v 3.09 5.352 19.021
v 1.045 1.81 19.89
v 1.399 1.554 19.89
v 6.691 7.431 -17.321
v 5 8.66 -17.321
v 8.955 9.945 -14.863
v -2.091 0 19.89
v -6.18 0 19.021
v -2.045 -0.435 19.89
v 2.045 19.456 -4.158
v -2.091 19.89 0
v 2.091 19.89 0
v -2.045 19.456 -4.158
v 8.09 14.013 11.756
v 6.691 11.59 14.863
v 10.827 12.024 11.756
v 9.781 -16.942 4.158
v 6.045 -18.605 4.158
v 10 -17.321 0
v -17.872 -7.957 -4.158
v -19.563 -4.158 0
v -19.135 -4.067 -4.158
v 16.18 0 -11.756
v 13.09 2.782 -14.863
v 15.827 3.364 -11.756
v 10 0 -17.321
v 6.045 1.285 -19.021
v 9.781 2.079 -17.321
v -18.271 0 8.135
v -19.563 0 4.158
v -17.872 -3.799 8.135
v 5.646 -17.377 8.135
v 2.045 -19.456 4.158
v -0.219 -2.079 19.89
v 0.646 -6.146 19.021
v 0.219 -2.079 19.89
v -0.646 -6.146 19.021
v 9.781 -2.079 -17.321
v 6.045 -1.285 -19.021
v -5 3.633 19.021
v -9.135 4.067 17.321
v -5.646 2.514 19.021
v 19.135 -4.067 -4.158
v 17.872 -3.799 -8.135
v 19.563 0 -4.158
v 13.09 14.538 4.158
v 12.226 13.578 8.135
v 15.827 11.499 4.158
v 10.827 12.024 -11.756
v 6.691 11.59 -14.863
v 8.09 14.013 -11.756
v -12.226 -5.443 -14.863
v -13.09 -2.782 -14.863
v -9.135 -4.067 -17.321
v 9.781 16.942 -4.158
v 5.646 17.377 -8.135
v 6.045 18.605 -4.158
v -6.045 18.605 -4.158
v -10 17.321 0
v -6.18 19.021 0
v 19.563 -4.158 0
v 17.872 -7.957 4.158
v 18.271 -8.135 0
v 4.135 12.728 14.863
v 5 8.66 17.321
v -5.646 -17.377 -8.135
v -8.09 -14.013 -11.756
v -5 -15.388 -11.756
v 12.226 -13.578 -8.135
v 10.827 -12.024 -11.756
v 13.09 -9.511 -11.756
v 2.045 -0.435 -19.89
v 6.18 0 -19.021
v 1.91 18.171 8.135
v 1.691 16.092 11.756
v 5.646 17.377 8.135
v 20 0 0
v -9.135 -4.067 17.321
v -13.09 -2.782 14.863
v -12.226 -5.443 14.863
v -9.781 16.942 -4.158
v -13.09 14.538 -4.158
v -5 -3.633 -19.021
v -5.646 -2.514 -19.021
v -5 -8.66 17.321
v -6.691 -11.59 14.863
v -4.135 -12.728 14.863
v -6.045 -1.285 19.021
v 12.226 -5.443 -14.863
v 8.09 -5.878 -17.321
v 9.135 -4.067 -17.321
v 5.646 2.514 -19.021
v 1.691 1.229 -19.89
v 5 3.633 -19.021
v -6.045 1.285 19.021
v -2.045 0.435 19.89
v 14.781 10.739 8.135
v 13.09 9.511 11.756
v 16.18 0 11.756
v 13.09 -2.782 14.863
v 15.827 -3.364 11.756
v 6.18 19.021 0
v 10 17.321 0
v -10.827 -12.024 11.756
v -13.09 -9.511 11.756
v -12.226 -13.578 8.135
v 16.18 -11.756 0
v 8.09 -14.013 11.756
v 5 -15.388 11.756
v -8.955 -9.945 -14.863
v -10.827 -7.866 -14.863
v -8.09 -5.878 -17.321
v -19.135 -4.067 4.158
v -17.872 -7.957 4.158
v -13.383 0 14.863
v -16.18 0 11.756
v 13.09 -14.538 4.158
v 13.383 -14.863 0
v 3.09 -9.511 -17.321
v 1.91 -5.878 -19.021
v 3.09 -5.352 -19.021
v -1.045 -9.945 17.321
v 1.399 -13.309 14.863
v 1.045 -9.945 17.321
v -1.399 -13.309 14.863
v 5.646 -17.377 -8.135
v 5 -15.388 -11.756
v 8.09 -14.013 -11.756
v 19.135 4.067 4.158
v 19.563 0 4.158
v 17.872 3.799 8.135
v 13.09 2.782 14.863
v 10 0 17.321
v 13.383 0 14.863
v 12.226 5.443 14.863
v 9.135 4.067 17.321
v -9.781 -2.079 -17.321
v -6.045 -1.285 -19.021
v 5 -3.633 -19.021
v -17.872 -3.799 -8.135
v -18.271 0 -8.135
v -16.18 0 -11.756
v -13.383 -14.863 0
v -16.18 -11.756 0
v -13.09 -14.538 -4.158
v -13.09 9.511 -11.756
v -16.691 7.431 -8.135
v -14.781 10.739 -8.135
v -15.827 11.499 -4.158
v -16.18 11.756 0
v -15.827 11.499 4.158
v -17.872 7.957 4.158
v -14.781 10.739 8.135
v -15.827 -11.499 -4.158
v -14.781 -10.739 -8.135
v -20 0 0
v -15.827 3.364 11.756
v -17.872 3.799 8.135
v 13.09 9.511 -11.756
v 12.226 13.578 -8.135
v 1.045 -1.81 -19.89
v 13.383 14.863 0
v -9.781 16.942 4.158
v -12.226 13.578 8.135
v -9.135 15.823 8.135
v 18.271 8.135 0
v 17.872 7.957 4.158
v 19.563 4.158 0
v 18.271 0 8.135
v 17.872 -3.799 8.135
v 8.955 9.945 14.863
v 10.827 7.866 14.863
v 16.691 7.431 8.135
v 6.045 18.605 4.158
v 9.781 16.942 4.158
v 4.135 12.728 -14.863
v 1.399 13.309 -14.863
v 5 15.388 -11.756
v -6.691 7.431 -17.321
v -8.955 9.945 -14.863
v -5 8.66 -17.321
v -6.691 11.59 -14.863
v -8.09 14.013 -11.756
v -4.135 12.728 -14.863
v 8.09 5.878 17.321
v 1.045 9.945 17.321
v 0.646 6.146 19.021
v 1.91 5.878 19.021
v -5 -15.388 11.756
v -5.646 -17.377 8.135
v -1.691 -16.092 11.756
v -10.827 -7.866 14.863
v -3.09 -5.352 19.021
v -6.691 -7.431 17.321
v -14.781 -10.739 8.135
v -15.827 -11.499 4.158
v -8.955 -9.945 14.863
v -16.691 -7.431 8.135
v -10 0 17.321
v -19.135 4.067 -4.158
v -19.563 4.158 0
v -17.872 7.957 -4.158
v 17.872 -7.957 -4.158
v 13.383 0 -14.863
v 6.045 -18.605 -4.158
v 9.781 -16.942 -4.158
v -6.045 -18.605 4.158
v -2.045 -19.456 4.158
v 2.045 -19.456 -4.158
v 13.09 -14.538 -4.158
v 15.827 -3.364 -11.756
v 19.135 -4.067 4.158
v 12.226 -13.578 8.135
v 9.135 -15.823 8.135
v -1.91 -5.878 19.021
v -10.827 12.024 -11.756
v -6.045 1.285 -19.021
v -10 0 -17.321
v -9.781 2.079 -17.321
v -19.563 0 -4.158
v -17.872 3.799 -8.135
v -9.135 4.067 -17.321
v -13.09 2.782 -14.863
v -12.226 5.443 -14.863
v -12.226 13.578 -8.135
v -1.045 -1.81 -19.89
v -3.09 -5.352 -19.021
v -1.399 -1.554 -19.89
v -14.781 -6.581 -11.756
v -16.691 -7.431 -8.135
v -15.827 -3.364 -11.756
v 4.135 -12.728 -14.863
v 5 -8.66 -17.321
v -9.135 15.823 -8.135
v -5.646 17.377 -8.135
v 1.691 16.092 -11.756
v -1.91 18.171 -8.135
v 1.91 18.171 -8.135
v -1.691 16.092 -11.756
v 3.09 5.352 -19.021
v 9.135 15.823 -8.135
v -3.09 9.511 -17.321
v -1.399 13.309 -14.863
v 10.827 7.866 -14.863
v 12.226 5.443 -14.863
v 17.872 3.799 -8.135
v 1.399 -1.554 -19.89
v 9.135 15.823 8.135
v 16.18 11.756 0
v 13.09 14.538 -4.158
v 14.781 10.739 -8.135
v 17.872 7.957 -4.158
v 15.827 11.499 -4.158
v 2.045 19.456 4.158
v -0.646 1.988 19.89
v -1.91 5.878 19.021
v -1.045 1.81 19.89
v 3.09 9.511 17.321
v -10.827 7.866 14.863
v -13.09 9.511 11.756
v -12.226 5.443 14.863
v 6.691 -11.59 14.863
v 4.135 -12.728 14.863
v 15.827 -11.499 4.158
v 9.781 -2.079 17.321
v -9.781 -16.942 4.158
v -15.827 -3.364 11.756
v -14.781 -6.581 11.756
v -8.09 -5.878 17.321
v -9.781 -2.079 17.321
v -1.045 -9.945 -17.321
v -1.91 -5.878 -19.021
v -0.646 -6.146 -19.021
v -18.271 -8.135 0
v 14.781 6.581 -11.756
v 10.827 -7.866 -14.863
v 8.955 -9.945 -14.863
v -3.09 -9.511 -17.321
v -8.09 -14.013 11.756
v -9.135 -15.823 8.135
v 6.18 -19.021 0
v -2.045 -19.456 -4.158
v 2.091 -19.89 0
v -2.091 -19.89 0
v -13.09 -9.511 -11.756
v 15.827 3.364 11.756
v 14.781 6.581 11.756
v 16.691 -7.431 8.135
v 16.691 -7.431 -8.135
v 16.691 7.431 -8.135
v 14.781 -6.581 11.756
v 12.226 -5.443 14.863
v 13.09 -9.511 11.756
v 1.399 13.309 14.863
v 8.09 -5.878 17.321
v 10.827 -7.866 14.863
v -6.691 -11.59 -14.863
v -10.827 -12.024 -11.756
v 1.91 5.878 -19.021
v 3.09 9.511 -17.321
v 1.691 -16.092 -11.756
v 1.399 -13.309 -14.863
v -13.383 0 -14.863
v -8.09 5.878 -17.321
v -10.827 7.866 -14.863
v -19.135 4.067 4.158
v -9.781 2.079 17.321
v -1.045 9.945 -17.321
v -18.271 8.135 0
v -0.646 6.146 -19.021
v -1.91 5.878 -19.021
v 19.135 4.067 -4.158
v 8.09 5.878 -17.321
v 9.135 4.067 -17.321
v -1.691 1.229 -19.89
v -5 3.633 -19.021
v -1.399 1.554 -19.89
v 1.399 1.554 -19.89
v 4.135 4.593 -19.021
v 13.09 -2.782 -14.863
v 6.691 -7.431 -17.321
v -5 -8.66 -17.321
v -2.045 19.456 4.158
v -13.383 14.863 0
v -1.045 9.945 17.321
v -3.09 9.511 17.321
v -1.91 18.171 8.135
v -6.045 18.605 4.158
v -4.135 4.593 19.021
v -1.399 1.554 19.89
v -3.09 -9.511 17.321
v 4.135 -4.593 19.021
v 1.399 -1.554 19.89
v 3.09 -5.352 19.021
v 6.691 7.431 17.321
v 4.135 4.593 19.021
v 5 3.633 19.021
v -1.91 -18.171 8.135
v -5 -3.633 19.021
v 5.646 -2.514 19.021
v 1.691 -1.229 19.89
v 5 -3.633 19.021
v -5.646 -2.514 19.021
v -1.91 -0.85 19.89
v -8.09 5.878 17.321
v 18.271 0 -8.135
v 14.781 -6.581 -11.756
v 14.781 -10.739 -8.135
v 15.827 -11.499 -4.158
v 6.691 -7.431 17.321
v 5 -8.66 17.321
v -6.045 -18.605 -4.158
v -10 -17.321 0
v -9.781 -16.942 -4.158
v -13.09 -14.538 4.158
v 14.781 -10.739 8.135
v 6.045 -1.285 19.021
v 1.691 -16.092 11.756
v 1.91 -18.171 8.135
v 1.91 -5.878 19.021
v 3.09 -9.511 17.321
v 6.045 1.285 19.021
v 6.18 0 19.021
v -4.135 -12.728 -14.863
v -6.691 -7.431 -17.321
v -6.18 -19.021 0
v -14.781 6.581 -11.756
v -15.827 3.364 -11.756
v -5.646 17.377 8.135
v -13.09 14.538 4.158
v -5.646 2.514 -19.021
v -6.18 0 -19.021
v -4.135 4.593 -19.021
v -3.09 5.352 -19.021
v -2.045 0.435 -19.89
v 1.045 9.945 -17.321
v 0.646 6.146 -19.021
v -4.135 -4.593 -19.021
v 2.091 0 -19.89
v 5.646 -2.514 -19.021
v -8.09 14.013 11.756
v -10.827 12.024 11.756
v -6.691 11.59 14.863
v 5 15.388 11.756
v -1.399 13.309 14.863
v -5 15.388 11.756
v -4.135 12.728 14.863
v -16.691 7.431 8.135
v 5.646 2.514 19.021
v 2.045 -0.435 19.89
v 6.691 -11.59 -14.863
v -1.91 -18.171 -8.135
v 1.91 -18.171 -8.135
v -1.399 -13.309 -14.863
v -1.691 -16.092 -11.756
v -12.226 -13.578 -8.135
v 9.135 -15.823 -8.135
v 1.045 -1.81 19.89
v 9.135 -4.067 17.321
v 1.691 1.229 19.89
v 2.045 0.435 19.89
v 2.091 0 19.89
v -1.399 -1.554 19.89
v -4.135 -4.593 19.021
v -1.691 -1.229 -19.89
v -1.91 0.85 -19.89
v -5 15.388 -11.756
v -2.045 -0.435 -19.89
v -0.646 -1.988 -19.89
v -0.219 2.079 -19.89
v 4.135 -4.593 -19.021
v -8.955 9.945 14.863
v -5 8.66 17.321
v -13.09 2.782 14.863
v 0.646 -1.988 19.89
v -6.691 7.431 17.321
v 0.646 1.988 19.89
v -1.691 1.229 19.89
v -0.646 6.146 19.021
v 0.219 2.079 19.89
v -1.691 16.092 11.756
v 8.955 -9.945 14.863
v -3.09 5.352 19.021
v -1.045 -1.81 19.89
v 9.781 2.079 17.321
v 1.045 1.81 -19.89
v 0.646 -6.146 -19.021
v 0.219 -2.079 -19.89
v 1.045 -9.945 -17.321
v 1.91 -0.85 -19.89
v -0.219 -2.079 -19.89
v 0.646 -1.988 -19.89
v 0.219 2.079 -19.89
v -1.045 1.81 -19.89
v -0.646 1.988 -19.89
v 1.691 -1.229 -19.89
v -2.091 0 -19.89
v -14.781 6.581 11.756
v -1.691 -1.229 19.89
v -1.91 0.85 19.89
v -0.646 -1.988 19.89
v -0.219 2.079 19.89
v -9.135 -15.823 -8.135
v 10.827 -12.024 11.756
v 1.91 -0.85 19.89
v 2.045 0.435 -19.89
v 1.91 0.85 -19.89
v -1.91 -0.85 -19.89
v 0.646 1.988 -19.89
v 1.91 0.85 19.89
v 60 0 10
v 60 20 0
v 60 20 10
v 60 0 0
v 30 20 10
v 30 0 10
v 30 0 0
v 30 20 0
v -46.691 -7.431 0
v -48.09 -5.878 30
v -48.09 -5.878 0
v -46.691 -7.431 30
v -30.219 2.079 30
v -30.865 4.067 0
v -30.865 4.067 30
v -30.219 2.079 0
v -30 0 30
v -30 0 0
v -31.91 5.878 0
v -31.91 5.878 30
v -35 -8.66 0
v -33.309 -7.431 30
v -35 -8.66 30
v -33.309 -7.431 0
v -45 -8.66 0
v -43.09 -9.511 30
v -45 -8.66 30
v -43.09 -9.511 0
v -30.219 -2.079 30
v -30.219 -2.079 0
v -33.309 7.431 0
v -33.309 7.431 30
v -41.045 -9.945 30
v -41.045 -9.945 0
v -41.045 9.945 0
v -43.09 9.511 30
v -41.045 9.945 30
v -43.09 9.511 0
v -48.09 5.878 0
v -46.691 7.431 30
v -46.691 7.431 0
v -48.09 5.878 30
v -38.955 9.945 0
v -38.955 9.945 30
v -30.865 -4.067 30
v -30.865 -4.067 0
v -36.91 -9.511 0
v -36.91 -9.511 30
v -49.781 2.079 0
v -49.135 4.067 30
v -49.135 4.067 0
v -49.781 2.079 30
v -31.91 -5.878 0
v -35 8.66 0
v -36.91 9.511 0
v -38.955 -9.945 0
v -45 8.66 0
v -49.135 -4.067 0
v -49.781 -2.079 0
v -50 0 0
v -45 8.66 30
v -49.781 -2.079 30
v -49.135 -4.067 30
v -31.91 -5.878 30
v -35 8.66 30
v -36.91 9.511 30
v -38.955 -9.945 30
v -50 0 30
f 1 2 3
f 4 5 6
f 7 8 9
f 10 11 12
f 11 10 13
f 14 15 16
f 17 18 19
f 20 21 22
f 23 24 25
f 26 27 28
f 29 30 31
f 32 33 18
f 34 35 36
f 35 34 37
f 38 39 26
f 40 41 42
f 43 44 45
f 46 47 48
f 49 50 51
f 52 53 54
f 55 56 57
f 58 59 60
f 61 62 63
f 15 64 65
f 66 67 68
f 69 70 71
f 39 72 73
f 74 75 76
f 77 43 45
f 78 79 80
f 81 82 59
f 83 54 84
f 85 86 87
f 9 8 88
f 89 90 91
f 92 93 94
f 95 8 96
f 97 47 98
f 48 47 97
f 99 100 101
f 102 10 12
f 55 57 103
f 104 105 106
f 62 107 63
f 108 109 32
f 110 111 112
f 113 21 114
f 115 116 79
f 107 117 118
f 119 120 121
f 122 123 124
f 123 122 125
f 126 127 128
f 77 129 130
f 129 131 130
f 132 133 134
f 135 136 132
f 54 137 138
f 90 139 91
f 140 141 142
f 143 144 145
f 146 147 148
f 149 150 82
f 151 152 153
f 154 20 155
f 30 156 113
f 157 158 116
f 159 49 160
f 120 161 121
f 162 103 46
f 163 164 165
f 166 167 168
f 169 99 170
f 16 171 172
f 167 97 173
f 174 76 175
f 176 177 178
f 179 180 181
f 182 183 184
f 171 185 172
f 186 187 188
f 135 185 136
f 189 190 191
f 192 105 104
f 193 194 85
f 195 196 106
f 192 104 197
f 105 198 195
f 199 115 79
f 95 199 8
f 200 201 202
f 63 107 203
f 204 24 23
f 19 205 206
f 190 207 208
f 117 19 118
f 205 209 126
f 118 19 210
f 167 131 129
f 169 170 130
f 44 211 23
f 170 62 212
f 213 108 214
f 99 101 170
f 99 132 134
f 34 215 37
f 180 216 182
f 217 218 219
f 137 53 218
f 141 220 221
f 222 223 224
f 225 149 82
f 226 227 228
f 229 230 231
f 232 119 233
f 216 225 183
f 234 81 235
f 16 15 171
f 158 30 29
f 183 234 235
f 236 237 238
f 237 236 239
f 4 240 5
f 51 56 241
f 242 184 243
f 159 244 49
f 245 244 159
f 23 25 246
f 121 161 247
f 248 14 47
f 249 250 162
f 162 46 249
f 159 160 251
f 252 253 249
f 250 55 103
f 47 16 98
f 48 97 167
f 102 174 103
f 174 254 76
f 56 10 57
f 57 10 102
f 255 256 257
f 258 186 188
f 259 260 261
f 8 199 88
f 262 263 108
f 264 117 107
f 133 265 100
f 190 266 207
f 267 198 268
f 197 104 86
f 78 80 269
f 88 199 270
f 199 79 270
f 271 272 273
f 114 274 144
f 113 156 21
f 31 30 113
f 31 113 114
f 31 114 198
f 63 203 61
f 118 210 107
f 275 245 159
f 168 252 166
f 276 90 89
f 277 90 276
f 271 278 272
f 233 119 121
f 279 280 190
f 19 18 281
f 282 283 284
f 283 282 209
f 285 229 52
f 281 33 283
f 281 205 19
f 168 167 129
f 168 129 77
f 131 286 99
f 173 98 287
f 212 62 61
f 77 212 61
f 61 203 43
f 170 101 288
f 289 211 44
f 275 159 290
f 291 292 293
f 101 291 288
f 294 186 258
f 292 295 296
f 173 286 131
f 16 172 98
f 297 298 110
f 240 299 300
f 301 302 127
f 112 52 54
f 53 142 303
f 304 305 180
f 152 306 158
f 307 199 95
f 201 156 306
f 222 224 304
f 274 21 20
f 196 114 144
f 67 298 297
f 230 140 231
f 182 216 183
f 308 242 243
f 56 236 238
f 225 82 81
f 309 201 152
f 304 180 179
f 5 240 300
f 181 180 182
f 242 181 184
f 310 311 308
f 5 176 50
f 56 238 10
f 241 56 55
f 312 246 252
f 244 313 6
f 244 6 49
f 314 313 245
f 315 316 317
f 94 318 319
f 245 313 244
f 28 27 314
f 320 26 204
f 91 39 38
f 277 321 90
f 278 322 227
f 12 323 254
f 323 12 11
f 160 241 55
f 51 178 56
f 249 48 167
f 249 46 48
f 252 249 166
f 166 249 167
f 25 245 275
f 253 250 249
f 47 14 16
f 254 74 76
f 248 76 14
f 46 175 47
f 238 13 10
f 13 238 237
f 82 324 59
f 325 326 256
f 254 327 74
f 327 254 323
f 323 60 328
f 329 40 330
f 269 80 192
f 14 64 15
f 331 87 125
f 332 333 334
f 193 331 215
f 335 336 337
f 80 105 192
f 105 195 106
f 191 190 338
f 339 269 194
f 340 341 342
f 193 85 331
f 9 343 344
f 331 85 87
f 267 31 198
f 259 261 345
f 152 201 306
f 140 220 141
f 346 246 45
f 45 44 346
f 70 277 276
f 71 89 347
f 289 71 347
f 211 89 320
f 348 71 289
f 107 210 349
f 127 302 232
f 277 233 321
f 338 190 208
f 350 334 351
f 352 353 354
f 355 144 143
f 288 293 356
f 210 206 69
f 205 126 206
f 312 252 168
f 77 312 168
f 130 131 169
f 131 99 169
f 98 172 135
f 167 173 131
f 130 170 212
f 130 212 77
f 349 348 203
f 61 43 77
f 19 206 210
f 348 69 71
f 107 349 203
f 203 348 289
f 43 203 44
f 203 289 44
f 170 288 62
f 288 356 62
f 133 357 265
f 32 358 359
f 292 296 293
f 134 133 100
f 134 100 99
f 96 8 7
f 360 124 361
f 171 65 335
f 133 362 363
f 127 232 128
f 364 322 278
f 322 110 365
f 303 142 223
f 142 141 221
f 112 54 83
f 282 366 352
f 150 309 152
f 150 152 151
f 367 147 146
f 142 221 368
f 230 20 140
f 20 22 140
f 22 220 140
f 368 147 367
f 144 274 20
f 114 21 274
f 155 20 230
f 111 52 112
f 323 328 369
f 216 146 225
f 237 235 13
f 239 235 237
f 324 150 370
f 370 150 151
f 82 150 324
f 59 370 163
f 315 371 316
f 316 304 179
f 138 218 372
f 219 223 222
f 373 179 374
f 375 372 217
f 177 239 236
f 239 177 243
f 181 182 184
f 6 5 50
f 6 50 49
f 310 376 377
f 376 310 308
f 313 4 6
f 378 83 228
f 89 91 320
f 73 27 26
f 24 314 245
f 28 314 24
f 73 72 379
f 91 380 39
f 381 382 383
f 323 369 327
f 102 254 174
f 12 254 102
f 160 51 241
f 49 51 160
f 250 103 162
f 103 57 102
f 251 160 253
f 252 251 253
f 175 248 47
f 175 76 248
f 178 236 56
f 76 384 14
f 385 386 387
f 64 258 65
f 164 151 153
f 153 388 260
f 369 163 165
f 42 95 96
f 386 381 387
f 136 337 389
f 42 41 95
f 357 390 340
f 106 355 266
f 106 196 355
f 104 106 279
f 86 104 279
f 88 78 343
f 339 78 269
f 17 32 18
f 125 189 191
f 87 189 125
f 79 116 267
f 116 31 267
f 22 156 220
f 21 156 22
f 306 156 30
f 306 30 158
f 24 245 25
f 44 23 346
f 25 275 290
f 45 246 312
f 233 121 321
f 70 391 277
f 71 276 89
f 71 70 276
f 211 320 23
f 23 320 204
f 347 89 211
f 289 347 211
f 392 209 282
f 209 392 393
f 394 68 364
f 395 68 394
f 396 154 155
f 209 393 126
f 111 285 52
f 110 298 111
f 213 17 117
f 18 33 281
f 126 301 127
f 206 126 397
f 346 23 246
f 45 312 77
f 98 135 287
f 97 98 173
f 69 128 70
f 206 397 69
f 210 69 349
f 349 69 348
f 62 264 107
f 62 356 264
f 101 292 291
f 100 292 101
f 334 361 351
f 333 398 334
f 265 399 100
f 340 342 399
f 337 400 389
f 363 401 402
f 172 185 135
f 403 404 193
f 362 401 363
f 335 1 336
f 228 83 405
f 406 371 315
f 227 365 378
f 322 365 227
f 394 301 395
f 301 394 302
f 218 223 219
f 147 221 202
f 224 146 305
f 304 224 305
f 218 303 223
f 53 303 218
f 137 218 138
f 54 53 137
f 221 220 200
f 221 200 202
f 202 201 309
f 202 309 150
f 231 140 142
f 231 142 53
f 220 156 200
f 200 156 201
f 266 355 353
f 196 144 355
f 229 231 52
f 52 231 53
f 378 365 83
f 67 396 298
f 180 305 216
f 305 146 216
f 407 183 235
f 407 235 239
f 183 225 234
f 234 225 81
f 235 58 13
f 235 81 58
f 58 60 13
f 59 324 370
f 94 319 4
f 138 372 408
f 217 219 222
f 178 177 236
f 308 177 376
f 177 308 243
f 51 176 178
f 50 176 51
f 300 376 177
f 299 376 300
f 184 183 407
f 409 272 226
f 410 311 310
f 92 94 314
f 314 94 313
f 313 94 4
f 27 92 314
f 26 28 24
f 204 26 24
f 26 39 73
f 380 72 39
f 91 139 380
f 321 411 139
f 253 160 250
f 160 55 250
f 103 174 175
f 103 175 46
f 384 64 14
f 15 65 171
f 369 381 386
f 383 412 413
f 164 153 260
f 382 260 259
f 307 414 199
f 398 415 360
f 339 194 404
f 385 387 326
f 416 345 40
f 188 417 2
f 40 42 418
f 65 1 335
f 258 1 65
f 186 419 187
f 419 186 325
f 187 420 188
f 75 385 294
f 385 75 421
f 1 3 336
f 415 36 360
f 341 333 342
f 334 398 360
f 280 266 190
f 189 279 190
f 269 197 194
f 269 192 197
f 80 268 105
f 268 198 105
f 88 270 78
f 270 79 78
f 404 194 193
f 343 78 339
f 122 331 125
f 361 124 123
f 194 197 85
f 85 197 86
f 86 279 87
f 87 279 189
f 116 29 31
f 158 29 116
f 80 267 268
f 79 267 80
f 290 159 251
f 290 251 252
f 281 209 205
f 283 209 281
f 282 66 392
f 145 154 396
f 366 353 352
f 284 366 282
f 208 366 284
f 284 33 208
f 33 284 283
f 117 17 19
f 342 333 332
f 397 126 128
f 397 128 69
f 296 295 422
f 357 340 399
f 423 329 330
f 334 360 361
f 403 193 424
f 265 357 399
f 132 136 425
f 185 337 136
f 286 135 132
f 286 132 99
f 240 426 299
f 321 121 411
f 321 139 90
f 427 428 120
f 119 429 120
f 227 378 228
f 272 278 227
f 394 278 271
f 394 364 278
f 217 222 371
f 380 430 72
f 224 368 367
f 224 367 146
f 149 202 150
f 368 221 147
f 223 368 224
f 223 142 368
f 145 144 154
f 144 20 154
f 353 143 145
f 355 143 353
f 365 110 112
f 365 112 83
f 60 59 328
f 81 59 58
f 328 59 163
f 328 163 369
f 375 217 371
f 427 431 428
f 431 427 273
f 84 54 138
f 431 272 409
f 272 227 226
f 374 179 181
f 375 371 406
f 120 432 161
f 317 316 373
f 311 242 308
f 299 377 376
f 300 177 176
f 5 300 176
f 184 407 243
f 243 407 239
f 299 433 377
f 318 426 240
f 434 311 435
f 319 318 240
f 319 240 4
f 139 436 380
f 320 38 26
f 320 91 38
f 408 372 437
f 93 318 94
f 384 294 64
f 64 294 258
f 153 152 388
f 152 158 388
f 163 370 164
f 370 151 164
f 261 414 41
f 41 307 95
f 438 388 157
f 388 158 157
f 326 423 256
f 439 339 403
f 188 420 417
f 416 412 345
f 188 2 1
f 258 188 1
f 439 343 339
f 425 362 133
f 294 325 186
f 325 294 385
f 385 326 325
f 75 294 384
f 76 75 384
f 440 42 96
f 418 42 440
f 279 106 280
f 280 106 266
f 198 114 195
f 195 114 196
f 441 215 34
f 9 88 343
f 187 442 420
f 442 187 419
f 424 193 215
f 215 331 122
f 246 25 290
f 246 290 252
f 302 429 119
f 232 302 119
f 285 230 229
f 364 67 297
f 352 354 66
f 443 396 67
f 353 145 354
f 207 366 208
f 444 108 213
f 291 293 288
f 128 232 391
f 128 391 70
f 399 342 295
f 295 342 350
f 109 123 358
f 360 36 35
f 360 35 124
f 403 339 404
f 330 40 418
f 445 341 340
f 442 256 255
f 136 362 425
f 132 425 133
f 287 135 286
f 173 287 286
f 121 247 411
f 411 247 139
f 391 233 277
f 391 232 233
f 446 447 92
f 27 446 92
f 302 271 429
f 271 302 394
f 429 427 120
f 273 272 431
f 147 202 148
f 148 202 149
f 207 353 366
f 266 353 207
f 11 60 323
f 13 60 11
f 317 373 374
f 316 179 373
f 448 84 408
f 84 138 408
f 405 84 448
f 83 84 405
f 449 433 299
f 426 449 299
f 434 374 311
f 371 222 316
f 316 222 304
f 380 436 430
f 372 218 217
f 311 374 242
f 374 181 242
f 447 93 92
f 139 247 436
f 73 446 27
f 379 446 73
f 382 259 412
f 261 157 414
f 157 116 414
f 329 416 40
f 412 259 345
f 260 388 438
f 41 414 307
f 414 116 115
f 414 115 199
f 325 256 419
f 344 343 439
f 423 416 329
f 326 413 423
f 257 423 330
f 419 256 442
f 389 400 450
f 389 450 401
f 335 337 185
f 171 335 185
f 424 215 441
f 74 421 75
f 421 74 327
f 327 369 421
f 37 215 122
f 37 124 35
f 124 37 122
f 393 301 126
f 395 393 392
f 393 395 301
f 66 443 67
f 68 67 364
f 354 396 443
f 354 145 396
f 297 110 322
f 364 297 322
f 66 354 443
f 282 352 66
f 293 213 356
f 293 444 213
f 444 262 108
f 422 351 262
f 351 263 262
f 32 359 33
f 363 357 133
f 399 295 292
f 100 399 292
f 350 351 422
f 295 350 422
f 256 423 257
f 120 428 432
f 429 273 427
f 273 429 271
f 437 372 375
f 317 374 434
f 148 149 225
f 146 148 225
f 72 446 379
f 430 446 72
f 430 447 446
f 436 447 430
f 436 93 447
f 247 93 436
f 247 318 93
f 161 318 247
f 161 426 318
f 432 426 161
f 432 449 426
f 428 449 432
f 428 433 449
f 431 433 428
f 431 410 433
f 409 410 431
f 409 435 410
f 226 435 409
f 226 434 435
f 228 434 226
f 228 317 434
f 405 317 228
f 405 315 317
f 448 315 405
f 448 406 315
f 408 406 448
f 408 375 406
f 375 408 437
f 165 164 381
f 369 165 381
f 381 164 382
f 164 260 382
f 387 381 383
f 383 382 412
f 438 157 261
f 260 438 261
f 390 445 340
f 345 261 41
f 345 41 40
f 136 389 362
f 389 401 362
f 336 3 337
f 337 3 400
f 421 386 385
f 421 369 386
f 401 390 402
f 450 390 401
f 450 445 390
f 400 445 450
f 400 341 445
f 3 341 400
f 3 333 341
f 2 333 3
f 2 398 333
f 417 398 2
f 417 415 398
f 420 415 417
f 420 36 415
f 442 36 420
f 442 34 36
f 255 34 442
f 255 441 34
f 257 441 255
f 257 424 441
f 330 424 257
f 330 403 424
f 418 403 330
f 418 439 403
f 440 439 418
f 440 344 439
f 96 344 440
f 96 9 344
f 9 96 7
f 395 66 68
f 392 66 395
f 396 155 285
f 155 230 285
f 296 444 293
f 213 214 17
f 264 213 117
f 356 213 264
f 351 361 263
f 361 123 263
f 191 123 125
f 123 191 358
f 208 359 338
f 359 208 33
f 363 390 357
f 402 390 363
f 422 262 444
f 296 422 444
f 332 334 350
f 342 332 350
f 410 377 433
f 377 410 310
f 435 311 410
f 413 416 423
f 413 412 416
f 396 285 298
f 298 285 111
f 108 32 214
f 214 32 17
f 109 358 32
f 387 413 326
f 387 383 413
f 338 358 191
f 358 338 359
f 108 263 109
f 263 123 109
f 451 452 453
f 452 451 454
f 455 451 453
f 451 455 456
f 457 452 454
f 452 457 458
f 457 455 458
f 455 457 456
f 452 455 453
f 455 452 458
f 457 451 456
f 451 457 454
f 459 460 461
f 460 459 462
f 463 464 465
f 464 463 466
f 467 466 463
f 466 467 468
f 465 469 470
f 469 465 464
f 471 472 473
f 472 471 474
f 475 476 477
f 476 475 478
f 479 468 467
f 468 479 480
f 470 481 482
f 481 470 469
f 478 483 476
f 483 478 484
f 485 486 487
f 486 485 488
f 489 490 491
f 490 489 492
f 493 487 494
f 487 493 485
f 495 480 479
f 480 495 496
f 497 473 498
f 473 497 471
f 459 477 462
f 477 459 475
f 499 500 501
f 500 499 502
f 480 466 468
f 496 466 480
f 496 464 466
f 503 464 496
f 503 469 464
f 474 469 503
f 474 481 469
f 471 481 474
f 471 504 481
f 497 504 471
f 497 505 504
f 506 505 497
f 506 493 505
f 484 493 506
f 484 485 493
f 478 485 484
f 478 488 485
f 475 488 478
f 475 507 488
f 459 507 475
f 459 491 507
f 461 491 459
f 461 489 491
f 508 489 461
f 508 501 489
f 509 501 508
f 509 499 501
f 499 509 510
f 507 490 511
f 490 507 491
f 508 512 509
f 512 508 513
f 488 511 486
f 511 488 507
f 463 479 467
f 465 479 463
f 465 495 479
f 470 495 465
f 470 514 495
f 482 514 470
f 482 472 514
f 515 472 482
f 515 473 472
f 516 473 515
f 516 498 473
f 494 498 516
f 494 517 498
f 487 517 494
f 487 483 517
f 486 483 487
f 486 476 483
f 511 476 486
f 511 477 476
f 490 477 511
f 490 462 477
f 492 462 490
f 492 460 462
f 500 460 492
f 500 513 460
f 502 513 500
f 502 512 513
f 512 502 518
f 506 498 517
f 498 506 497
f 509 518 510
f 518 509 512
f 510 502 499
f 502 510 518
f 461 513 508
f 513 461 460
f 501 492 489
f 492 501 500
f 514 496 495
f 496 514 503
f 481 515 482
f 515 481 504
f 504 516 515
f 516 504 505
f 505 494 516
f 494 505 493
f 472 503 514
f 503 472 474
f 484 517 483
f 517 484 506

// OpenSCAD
sphere(20);

translate( [30, 0, 0] )
cube([30, 20, 10]);

translate( [ -40, 0, 0])
cylinder(h=30, r=10);
